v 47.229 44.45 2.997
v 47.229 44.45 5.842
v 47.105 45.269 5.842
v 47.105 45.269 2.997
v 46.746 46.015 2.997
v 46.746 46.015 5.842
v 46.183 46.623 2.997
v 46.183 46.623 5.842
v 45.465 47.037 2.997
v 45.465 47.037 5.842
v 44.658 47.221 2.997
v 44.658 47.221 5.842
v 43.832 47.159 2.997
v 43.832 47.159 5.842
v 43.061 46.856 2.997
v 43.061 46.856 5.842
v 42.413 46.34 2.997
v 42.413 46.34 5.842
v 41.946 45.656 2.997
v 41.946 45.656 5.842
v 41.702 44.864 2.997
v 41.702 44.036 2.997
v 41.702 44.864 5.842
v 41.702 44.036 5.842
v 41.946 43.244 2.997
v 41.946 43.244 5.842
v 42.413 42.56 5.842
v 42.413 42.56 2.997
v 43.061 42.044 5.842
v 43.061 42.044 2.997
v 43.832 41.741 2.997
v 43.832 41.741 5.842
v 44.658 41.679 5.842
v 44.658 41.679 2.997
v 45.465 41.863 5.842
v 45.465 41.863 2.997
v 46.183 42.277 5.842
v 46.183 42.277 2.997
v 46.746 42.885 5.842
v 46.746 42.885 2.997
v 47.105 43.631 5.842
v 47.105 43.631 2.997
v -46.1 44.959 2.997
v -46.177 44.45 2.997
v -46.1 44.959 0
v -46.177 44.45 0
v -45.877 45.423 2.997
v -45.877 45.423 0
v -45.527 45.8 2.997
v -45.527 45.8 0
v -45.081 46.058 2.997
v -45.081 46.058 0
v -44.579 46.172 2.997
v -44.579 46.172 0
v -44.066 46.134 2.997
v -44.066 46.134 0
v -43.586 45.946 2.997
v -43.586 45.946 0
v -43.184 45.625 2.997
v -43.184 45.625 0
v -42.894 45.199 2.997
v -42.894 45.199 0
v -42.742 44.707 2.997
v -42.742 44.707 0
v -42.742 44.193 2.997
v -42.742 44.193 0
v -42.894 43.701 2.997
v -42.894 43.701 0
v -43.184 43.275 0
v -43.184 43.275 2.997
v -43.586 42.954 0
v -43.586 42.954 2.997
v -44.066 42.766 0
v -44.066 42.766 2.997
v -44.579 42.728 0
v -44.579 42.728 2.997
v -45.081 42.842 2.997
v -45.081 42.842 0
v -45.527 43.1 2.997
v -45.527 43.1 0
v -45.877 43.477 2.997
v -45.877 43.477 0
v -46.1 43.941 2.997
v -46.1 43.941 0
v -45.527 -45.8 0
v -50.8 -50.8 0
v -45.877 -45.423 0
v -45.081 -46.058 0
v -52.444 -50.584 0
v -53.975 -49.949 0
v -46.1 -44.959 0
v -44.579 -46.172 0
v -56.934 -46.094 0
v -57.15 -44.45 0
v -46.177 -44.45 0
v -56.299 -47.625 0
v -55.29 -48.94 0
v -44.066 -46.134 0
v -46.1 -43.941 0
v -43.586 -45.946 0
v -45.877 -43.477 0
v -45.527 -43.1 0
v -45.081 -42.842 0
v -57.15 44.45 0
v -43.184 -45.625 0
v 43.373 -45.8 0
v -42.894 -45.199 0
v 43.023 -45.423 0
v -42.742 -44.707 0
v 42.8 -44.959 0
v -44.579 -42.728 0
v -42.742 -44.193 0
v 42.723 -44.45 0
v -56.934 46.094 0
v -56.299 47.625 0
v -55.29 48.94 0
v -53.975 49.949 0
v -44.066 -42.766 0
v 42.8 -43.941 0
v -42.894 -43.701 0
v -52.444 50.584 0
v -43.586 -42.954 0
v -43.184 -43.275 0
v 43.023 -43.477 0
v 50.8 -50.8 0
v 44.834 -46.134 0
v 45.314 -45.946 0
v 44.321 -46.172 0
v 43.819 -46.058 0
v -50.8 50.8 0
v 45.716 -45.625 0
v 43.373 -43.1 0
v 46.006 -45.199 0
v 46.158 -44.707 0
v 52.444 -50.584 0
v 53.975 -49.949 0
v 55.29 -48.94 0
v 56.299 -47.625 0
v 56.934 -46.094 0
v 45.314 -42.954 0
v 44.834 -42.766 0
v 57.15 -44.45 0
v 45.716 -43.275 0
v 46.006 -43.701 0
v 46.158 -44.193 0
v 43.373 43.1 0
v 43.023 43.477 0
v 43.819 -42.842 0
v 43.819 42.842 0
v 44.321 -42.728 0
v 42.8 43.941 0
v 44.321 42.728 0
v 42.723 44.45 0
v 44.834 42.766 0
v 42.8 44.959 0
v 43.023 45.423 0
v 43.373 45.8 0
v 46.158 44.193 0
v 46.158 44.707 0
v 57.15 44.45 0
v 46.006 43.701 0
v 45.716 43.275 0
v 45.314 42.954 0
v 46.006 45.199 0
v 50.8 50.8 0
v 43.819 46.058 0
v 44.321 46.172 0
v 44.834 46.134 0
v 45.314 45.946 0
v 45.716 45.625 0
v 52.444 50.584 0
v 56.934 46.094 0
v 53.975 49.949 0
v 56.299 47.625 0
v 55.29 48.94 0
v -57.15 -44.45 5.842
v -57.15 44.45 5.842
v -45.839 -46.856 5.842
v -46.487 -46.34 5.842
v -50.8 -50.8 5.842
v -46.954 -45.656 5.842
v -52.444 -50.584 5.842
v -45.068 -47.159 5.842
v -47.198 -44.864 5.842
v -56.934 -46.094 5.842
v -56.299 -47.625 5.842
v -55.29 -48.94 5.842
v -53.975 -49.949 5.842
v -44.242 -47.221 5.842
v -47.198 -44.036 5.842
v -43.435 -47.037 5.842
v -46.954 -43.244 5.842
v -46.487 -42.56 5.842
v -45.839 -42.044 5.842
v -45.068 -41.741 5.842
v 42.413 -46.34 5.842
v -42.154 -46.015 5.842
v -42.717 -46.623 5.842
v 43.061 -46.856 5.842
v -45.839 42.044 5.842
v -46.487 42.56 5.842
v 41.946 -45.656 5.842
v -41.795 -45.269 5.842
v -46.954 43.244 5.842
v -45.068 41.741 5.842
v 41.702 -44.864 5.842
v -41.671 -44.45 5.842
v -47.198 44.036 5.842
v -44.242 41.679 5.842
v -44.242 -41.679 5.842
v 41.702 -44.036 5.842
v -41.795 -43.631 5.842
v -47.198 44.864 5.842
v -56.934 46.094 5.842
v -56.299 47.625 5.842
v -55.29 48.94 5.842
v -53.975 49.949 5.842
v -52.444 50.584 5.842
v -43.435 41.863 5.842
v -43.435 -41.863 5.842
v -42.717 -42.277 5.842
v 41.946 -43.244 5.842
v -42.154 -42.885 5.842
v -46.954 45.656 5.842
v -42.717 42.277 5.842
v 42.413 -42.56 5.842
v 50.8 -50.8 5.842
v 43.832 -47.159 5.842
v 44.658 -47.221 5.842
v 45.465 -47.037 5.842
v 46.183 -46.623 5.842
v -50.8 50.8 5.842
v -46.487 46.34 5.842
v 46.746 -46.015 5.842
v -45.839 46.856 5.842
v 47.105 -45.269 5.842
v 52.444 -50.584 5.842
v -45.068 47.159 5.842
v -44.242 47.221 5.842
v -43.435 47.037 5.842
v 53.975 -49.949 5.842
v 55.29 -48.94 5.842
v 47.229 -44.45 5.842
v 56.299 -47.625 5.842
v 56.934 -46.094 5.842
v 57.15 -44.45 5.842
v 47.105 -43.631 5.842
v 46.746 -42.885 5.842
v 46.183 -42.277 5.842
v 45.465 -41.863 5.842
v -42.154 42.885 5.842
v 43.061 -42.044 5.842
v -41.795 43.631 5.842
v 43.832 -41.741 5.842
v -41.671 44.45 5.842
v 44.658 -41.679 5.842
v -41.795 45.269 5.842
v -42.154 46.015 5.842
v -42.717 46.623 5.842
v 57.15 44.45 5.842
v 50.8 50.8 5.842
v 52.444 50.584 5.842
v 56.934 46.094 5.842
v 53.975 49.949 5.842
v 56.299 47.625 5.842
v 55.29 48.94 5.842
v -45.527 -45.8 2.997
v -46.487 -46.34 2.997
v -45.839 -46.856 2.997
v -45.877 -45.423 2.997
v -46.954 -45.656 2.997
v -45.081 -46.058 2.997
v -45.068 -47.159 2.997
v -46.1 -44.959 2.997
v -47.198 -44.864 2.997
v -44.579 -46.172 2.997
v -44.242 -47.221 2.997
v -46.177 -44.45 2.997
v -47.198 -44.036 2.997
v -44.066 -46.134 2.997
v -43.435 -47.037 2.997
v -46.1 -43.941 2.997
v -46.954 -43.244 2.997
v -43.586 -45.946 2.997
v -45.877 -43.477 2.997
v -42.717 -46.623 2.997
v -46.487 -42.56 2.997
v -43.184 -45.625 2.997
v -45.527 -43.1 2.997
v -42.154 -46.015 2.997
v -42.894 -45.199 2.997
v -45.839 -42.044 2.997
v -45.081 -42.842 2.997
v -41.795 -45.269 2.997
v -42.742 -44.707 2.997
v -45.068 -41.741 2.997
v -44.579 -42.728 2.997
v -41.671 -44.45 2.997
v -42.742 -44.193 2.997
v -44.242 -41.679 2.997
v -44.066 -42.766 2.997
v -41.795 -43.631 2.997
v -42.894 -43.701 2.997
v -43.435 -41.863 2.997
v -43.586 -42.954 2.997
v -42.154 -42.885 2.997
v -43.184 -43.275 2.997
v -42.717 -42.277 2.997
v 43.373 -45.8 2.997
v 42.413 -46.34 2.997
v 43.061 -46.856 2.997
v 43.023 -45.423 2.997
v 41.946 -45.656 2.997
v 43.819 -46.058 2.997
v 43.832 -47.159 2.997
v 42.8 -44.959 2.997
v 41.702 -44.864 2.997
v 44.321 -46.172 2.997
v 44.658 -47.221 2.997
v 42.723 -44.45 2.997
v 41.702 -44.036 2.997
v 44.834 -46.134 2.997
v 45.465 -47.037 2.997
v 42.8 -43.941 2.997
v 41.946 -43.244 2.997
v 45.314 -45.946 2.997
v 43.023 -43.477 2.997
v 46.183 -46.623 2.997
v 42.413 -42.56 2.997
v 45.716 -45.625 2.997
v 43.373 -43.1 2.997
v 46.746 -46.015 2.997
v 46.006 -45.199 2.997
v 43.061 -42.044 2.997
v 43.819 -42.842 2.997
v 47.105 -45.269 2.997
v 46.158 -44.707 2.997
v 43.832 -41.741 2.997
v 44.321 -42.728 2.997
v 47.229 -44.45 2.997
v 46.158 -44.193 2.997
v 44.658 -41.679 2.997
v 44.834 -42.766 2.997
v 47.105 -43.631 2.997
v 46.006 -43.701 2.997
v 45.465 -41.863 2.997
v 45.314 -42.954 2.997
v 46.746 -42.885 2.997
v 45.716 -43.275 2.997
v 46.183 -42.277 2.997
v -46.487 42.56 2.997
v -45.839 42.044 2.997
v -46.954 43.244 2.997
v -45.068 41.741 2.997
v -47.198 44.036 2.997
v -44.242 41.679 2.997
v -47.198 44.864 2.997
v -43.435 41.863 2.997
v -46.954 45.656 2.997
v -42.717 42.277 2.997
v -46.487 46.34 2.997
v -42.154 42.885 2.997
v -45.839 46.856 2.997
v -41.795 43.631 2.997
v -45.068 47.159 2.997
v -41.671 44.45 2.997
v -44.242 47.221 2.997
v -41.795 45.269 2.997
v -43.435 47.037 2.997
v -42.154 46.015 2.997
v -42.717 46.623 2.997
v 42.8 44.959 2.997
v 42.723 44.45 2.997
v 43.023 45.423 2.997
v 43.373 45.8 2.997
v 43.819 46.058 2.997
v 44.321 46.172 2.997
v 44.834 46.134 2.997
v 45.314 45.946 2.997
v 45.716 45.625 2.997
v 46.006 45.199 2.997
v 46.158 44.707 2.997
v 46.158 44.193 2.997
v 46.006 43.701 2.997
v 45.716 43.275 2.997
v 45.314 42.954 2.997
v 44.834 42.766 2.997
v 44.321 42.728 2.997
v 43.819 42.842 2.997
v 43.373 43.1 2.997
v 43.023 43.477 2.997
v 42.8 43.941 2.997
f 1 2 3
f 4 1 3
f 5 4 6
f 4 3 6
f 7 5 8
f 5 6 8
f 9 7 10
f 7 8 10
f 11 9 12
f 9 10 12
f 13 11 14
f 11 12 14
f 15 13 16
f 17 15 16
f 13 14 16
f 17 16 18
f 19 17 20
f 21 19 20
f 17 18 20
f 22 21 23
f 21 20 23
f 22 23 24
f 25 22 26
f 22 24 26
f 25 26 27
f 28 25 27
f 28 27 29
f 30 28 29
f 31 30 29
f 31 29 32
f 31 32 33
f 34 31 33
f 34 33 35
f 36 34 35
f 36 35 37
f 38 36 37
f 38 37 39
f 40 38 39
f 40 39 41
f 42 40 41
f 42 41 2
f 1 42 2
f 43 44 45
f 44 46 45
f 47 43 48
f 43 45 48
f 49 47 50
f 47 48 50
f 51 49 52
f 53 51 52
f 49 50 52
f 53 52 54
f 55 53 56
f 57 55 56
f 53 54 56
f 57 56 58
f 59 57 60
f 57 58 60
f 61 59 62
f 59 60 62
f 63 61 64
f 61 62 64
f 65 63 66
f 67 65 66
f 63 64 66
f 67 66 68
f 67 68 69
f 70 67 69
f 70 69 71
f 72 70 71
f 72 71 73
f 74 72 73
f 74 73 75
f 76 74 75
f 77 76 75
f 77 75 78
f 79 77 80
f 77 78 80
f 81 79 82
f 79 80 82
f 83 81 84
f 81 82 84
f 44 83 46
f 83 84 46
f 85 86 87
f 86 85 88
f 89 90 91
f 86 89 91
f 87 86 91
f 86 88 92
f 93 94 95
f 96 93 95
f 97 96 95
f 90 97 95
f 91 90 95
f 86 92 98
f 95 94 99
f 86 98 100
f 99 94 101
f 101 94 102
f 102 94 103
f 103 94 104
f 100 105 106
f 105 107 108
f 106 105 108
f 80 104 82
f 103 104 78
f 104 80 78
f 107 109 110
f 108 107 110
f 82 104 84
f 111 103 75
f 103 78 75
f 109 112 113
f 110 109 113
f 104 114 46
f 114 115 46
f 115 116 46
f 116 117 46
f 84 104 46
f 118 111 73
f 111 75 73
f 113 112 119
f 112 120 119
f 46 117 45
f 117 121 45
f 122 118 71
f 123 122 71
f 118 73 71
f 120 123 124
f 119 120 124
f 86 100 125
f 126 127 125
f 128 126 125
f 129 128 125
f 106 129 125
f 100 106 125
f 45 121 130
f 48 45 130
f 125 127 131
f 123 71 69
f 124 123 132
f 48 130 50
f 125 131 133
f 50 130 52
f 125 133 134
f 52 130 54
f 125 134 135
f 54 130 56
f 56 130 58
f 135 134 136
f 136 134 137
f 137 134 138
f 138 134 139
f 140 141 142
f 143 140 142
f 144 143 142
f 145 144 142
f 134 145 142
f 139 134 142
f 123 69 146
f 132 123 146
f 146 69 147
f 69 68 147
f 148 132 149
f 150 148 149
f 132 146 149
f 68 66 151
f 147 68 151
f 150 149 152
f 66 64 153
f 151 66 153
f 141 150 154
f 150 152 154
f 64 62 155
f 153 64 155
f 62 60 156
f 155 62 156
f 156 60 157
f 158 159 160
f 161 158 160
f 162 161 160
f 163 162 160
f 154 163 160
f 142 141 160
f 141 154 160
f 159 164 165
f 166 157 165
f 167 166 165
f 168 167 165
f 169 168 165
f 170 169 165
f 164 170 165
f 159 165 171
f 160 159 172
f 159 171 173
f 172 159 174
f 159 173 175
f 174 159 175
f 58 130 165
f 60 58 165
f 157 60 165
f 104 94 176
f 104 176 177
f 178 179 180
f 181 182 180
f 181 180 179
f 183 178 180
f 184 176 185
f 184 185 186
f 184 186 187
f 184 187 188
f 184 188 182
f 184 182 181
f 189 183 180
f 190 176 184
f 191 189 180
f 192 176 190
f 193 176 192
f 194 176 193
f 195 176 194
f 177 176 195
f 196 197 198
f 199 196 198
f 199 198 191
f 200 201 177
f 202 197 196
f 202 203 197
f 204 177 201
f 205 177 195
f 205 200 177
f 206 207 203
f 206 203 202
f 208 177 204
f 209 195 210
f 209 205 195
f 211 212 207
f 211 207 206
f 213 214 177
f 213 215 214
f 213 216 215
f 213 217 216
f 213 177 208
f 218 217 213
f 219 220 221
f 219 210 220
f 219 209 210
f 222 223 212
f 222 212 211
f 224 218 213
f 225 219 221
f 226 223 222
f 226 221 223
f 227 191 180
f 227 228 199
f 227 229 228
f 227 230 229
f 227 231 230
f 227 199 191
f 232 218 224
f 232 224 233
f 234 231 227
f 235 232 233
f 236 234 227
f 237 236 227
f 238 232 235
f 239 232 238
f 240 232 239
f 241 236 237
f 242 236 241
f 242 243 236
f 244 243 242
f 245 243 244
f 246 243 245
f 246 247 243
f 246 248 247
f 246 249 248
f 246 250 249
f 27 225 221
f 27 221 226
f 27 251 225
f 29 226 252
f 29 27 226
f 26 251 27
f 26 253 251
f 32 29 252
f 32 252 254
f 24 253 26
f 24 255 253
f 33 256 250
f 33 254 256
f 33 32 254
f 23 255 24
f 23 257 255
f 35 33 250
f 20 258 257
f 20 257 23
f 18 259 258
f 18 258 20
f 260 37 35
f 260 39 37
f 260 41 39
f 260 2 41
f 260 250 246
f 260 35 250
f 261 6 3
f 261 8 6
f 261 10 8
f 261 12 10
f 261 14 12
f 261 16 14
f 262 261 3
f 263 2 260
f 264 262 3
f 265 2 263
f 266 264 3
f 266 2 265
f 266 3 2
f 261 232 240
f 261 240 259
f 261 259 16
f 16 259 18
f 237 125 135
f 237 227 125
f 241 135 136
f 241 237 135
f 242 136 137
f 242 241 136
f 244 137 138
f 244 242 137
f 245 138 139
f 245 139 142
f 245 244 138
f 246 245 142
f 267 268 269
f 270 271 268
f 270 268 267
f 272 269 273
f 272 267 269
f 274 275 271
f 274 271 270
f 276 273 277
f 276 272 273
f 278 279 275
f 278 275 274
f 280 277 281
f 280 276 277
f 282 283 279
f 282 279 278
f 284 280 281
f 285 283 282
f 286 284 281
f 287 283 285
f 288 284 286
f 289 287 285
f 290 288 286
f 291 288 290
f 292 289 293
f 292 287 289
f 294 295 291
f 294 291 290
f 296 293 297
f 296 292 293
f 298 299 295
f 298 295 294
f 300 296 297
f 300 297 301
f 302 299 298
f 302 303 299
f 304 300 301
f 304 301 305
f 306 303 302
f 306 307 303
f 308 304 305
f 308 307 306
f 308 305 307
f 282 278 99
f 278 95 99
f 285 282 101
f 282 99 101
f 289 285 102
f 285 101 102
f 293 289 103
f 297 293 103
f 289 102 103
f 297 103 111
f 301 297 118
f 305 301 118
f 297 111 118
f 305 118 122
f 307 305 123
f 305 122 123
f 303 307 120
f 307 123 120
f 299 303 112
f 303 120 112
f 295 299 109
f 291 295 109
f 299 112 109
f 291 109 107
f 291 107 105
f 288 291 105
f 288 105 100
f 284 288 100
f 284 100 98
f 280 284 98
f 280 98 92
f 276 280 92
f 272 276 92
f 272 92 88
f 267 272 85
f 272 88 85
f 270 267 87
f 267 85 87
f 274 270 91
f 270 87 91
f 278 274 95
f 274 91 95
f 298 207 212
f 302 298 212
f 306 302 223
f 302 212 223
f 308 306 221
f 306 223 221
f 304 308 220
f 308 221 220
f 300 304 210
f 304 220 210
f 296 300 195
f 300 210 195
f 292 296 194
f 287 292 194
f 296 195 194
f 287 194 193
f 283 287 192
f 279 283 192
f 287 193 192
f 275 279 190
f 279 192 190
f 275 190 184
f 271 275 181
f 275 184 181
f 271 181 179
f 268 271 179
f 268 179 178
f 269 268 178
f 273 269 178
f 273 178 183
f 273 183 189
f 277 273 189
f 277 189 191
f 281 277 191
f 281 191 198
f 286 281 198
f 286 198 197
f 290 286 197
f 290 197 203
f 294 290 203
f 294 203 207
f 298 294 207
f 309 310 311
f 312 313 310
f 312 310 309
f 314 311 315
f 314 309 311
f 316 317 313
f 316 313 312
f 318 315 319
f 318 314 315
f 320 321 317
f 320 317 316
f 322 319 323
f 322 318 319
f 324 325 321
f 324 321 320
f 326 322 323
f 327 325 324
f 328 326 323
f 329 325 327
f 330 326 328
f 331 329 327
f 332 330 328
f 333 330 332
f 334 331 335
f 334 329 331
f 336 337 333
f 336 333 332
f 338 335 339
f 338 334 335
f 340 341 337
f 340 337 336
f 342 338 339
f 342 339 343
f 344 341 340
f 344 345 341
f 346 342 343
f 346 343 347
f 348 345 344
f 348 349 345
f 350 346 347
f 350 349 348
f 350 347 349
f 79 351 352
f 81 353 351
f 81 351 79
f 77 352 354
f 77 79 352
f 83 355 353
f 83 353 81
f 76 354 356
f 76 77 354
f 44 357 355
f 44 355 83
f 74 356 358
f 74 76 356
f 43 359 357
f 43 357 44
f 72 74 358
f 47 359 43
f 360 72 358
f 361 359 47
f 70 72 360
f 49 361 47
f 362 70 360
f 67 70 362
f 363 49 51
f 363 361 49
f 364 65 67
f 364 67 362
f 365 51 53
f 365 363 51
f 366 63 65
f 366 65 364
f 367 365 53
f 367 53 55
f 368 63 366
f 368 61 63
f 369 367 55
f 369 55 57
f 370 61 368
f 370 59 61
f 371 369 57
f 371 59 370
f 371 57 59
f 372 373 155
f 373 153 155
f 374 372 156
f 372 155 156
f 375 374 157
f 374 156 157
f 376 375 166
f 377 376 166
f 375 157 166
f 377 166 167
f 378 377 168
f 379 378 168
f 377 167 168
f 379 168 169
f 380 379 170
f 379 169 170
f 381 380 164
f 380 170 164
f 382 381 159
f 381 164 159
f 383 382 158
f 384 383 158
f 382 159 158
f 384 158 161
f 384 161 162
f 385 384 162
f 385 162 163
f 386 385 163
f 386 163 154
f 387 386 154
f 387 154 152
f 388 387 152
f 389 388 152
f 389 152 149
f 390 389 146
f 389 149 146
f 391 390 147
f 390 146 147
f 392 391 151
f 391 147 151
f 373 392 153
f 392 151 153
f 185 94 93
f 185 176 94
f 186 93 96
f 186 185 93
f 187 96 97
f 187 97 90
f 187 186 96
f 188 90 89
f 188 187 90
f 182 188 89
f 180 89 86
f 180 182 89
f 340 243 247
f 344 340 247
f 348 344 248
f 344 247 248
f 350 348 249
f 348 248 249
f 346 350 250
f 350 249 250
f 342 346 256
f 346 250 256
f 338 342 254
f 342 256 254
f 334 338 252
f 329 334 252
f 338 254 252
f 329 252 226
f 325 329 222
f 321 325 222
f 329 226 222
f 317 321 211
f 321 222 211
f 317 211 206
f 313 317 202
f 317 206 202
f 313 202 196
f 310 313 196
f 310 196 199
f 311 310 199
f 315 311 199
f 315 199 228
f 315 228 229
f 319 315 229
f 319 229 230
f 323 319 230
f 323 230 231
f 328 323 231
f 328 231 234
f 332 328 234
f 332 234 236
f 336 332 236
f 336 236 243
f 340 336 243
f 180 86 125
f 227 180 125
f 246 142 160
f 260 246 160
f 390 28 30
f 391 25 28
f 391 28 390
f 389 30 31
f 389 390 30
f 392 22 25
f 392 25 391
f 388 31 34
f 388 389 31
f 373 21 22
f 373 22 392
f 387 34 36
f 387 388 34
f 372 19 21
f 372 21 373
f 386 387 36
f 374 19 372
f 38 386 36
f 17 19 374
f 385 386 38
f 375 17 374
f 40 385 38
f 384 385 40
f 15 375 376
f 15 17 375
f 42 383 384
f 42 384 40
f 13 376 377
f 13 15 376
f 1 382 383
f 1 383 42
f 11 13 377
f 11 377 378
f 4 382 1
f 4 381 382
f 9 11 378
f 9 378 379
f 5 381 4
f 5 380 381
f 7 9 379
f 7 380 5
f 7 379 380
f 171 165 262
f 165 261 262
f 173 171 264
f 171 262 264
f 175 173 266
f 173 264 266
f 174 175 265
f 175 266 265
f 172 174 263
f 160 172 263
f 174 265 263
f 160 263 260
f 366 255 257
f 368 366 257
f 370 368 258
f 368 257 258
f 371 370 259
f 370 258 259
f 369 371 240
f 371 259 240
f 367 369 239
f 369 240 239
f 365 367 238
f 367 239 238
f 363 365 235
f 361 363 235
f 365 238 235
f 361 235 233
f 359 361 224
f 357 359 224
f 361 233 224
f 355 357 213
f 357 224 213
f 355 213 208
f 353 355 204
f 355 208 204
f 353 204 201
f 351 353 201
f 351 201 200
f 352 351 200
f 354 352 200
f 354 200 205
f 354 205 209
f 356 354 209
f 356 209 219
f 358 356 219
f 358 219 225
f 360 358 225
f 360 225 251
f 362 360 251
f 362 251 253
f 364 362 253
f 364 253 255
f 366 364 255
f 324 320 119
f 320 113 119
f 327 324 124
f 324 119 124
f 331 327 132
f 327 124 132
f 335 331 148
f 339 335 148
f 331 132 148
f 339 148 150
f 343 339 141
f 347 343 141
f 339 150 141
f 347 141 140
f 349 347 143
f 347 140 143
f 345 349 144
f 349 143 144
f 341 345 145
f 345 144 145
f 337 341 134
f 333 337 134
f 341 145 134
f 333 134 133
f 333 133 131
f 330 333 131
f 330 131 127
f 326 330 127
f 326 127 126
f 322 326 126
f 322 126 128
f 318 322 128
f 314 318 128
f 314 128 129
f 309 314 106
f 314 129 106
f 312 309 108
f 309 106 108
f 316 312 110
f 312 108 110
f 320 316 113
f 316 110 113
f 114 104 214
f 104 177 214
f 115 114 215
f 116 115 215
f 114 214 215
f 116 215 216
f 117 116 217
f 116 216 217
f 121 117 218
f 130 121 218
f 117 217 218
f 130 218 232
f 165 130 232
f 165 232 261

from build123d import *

# Parameters (mm, degrees)
SKETCH1_W                                      = 114.3
SKETCH1_H                                      = 101.6
BOSS_EXTRUDE1_DEPTH                            = 5.842
CBORE_FOR_4_SOCKET_HEAD_CAP_SCREW1_D           = 3.4544
CBORE_FOR_4_SOCKET_HEAD_CAP_SCREW1_CBORE_D     = 5.55752
CBORE_FOR_4_SOCKET_HEAD_CAP_SCREW1_CBORE_DEPTH = 2.8448
FILLET1_R                                      = 6.35


with BuildPart() as part:
    # Sketch1 → Boss-Extrude1 (new body)
    with BuildSketch(Plane.XY):
        Rectangle(SKETCH1_W, SKETCH1_H)
    extrude(amount=BOSS_EXTRUDE1_DEPTH)

    # CBORE for #4 Socket Head Cap Screw1 (through all)
    with Locations(Plane.XY.offset(5.842)):
        with Locations((-44.45, 44.45), (-44.45, -44.45), (44.45, -44.45), (44.45, 44.45)):
            CounterBoreHole(CBORE_FOR_4_SOCKET_HEAD_CAP_SCREW1_D / 2, CBORE_FOR_4_SOCKET_HEAD_CAP_SCREW1_CBORE_D / 2, CBORE_FOR_4_SOCKET_HEAD_CAP_SCREW1_CBORE_DEPTH)

    # Fillet1
    fillet1_edges = [part.edges().sort_by_distance(p)[0] for p in [
        (57.15, -50.8, 2.921),
        (-57.15, -50.8, 2.921),
        (-57.15, 50.8, 2.921),
        (57.15, 50.8, 2.921),
    ]]
    fillet(fillet1_edges, radius=FILLET1_R)


solid = part.part
